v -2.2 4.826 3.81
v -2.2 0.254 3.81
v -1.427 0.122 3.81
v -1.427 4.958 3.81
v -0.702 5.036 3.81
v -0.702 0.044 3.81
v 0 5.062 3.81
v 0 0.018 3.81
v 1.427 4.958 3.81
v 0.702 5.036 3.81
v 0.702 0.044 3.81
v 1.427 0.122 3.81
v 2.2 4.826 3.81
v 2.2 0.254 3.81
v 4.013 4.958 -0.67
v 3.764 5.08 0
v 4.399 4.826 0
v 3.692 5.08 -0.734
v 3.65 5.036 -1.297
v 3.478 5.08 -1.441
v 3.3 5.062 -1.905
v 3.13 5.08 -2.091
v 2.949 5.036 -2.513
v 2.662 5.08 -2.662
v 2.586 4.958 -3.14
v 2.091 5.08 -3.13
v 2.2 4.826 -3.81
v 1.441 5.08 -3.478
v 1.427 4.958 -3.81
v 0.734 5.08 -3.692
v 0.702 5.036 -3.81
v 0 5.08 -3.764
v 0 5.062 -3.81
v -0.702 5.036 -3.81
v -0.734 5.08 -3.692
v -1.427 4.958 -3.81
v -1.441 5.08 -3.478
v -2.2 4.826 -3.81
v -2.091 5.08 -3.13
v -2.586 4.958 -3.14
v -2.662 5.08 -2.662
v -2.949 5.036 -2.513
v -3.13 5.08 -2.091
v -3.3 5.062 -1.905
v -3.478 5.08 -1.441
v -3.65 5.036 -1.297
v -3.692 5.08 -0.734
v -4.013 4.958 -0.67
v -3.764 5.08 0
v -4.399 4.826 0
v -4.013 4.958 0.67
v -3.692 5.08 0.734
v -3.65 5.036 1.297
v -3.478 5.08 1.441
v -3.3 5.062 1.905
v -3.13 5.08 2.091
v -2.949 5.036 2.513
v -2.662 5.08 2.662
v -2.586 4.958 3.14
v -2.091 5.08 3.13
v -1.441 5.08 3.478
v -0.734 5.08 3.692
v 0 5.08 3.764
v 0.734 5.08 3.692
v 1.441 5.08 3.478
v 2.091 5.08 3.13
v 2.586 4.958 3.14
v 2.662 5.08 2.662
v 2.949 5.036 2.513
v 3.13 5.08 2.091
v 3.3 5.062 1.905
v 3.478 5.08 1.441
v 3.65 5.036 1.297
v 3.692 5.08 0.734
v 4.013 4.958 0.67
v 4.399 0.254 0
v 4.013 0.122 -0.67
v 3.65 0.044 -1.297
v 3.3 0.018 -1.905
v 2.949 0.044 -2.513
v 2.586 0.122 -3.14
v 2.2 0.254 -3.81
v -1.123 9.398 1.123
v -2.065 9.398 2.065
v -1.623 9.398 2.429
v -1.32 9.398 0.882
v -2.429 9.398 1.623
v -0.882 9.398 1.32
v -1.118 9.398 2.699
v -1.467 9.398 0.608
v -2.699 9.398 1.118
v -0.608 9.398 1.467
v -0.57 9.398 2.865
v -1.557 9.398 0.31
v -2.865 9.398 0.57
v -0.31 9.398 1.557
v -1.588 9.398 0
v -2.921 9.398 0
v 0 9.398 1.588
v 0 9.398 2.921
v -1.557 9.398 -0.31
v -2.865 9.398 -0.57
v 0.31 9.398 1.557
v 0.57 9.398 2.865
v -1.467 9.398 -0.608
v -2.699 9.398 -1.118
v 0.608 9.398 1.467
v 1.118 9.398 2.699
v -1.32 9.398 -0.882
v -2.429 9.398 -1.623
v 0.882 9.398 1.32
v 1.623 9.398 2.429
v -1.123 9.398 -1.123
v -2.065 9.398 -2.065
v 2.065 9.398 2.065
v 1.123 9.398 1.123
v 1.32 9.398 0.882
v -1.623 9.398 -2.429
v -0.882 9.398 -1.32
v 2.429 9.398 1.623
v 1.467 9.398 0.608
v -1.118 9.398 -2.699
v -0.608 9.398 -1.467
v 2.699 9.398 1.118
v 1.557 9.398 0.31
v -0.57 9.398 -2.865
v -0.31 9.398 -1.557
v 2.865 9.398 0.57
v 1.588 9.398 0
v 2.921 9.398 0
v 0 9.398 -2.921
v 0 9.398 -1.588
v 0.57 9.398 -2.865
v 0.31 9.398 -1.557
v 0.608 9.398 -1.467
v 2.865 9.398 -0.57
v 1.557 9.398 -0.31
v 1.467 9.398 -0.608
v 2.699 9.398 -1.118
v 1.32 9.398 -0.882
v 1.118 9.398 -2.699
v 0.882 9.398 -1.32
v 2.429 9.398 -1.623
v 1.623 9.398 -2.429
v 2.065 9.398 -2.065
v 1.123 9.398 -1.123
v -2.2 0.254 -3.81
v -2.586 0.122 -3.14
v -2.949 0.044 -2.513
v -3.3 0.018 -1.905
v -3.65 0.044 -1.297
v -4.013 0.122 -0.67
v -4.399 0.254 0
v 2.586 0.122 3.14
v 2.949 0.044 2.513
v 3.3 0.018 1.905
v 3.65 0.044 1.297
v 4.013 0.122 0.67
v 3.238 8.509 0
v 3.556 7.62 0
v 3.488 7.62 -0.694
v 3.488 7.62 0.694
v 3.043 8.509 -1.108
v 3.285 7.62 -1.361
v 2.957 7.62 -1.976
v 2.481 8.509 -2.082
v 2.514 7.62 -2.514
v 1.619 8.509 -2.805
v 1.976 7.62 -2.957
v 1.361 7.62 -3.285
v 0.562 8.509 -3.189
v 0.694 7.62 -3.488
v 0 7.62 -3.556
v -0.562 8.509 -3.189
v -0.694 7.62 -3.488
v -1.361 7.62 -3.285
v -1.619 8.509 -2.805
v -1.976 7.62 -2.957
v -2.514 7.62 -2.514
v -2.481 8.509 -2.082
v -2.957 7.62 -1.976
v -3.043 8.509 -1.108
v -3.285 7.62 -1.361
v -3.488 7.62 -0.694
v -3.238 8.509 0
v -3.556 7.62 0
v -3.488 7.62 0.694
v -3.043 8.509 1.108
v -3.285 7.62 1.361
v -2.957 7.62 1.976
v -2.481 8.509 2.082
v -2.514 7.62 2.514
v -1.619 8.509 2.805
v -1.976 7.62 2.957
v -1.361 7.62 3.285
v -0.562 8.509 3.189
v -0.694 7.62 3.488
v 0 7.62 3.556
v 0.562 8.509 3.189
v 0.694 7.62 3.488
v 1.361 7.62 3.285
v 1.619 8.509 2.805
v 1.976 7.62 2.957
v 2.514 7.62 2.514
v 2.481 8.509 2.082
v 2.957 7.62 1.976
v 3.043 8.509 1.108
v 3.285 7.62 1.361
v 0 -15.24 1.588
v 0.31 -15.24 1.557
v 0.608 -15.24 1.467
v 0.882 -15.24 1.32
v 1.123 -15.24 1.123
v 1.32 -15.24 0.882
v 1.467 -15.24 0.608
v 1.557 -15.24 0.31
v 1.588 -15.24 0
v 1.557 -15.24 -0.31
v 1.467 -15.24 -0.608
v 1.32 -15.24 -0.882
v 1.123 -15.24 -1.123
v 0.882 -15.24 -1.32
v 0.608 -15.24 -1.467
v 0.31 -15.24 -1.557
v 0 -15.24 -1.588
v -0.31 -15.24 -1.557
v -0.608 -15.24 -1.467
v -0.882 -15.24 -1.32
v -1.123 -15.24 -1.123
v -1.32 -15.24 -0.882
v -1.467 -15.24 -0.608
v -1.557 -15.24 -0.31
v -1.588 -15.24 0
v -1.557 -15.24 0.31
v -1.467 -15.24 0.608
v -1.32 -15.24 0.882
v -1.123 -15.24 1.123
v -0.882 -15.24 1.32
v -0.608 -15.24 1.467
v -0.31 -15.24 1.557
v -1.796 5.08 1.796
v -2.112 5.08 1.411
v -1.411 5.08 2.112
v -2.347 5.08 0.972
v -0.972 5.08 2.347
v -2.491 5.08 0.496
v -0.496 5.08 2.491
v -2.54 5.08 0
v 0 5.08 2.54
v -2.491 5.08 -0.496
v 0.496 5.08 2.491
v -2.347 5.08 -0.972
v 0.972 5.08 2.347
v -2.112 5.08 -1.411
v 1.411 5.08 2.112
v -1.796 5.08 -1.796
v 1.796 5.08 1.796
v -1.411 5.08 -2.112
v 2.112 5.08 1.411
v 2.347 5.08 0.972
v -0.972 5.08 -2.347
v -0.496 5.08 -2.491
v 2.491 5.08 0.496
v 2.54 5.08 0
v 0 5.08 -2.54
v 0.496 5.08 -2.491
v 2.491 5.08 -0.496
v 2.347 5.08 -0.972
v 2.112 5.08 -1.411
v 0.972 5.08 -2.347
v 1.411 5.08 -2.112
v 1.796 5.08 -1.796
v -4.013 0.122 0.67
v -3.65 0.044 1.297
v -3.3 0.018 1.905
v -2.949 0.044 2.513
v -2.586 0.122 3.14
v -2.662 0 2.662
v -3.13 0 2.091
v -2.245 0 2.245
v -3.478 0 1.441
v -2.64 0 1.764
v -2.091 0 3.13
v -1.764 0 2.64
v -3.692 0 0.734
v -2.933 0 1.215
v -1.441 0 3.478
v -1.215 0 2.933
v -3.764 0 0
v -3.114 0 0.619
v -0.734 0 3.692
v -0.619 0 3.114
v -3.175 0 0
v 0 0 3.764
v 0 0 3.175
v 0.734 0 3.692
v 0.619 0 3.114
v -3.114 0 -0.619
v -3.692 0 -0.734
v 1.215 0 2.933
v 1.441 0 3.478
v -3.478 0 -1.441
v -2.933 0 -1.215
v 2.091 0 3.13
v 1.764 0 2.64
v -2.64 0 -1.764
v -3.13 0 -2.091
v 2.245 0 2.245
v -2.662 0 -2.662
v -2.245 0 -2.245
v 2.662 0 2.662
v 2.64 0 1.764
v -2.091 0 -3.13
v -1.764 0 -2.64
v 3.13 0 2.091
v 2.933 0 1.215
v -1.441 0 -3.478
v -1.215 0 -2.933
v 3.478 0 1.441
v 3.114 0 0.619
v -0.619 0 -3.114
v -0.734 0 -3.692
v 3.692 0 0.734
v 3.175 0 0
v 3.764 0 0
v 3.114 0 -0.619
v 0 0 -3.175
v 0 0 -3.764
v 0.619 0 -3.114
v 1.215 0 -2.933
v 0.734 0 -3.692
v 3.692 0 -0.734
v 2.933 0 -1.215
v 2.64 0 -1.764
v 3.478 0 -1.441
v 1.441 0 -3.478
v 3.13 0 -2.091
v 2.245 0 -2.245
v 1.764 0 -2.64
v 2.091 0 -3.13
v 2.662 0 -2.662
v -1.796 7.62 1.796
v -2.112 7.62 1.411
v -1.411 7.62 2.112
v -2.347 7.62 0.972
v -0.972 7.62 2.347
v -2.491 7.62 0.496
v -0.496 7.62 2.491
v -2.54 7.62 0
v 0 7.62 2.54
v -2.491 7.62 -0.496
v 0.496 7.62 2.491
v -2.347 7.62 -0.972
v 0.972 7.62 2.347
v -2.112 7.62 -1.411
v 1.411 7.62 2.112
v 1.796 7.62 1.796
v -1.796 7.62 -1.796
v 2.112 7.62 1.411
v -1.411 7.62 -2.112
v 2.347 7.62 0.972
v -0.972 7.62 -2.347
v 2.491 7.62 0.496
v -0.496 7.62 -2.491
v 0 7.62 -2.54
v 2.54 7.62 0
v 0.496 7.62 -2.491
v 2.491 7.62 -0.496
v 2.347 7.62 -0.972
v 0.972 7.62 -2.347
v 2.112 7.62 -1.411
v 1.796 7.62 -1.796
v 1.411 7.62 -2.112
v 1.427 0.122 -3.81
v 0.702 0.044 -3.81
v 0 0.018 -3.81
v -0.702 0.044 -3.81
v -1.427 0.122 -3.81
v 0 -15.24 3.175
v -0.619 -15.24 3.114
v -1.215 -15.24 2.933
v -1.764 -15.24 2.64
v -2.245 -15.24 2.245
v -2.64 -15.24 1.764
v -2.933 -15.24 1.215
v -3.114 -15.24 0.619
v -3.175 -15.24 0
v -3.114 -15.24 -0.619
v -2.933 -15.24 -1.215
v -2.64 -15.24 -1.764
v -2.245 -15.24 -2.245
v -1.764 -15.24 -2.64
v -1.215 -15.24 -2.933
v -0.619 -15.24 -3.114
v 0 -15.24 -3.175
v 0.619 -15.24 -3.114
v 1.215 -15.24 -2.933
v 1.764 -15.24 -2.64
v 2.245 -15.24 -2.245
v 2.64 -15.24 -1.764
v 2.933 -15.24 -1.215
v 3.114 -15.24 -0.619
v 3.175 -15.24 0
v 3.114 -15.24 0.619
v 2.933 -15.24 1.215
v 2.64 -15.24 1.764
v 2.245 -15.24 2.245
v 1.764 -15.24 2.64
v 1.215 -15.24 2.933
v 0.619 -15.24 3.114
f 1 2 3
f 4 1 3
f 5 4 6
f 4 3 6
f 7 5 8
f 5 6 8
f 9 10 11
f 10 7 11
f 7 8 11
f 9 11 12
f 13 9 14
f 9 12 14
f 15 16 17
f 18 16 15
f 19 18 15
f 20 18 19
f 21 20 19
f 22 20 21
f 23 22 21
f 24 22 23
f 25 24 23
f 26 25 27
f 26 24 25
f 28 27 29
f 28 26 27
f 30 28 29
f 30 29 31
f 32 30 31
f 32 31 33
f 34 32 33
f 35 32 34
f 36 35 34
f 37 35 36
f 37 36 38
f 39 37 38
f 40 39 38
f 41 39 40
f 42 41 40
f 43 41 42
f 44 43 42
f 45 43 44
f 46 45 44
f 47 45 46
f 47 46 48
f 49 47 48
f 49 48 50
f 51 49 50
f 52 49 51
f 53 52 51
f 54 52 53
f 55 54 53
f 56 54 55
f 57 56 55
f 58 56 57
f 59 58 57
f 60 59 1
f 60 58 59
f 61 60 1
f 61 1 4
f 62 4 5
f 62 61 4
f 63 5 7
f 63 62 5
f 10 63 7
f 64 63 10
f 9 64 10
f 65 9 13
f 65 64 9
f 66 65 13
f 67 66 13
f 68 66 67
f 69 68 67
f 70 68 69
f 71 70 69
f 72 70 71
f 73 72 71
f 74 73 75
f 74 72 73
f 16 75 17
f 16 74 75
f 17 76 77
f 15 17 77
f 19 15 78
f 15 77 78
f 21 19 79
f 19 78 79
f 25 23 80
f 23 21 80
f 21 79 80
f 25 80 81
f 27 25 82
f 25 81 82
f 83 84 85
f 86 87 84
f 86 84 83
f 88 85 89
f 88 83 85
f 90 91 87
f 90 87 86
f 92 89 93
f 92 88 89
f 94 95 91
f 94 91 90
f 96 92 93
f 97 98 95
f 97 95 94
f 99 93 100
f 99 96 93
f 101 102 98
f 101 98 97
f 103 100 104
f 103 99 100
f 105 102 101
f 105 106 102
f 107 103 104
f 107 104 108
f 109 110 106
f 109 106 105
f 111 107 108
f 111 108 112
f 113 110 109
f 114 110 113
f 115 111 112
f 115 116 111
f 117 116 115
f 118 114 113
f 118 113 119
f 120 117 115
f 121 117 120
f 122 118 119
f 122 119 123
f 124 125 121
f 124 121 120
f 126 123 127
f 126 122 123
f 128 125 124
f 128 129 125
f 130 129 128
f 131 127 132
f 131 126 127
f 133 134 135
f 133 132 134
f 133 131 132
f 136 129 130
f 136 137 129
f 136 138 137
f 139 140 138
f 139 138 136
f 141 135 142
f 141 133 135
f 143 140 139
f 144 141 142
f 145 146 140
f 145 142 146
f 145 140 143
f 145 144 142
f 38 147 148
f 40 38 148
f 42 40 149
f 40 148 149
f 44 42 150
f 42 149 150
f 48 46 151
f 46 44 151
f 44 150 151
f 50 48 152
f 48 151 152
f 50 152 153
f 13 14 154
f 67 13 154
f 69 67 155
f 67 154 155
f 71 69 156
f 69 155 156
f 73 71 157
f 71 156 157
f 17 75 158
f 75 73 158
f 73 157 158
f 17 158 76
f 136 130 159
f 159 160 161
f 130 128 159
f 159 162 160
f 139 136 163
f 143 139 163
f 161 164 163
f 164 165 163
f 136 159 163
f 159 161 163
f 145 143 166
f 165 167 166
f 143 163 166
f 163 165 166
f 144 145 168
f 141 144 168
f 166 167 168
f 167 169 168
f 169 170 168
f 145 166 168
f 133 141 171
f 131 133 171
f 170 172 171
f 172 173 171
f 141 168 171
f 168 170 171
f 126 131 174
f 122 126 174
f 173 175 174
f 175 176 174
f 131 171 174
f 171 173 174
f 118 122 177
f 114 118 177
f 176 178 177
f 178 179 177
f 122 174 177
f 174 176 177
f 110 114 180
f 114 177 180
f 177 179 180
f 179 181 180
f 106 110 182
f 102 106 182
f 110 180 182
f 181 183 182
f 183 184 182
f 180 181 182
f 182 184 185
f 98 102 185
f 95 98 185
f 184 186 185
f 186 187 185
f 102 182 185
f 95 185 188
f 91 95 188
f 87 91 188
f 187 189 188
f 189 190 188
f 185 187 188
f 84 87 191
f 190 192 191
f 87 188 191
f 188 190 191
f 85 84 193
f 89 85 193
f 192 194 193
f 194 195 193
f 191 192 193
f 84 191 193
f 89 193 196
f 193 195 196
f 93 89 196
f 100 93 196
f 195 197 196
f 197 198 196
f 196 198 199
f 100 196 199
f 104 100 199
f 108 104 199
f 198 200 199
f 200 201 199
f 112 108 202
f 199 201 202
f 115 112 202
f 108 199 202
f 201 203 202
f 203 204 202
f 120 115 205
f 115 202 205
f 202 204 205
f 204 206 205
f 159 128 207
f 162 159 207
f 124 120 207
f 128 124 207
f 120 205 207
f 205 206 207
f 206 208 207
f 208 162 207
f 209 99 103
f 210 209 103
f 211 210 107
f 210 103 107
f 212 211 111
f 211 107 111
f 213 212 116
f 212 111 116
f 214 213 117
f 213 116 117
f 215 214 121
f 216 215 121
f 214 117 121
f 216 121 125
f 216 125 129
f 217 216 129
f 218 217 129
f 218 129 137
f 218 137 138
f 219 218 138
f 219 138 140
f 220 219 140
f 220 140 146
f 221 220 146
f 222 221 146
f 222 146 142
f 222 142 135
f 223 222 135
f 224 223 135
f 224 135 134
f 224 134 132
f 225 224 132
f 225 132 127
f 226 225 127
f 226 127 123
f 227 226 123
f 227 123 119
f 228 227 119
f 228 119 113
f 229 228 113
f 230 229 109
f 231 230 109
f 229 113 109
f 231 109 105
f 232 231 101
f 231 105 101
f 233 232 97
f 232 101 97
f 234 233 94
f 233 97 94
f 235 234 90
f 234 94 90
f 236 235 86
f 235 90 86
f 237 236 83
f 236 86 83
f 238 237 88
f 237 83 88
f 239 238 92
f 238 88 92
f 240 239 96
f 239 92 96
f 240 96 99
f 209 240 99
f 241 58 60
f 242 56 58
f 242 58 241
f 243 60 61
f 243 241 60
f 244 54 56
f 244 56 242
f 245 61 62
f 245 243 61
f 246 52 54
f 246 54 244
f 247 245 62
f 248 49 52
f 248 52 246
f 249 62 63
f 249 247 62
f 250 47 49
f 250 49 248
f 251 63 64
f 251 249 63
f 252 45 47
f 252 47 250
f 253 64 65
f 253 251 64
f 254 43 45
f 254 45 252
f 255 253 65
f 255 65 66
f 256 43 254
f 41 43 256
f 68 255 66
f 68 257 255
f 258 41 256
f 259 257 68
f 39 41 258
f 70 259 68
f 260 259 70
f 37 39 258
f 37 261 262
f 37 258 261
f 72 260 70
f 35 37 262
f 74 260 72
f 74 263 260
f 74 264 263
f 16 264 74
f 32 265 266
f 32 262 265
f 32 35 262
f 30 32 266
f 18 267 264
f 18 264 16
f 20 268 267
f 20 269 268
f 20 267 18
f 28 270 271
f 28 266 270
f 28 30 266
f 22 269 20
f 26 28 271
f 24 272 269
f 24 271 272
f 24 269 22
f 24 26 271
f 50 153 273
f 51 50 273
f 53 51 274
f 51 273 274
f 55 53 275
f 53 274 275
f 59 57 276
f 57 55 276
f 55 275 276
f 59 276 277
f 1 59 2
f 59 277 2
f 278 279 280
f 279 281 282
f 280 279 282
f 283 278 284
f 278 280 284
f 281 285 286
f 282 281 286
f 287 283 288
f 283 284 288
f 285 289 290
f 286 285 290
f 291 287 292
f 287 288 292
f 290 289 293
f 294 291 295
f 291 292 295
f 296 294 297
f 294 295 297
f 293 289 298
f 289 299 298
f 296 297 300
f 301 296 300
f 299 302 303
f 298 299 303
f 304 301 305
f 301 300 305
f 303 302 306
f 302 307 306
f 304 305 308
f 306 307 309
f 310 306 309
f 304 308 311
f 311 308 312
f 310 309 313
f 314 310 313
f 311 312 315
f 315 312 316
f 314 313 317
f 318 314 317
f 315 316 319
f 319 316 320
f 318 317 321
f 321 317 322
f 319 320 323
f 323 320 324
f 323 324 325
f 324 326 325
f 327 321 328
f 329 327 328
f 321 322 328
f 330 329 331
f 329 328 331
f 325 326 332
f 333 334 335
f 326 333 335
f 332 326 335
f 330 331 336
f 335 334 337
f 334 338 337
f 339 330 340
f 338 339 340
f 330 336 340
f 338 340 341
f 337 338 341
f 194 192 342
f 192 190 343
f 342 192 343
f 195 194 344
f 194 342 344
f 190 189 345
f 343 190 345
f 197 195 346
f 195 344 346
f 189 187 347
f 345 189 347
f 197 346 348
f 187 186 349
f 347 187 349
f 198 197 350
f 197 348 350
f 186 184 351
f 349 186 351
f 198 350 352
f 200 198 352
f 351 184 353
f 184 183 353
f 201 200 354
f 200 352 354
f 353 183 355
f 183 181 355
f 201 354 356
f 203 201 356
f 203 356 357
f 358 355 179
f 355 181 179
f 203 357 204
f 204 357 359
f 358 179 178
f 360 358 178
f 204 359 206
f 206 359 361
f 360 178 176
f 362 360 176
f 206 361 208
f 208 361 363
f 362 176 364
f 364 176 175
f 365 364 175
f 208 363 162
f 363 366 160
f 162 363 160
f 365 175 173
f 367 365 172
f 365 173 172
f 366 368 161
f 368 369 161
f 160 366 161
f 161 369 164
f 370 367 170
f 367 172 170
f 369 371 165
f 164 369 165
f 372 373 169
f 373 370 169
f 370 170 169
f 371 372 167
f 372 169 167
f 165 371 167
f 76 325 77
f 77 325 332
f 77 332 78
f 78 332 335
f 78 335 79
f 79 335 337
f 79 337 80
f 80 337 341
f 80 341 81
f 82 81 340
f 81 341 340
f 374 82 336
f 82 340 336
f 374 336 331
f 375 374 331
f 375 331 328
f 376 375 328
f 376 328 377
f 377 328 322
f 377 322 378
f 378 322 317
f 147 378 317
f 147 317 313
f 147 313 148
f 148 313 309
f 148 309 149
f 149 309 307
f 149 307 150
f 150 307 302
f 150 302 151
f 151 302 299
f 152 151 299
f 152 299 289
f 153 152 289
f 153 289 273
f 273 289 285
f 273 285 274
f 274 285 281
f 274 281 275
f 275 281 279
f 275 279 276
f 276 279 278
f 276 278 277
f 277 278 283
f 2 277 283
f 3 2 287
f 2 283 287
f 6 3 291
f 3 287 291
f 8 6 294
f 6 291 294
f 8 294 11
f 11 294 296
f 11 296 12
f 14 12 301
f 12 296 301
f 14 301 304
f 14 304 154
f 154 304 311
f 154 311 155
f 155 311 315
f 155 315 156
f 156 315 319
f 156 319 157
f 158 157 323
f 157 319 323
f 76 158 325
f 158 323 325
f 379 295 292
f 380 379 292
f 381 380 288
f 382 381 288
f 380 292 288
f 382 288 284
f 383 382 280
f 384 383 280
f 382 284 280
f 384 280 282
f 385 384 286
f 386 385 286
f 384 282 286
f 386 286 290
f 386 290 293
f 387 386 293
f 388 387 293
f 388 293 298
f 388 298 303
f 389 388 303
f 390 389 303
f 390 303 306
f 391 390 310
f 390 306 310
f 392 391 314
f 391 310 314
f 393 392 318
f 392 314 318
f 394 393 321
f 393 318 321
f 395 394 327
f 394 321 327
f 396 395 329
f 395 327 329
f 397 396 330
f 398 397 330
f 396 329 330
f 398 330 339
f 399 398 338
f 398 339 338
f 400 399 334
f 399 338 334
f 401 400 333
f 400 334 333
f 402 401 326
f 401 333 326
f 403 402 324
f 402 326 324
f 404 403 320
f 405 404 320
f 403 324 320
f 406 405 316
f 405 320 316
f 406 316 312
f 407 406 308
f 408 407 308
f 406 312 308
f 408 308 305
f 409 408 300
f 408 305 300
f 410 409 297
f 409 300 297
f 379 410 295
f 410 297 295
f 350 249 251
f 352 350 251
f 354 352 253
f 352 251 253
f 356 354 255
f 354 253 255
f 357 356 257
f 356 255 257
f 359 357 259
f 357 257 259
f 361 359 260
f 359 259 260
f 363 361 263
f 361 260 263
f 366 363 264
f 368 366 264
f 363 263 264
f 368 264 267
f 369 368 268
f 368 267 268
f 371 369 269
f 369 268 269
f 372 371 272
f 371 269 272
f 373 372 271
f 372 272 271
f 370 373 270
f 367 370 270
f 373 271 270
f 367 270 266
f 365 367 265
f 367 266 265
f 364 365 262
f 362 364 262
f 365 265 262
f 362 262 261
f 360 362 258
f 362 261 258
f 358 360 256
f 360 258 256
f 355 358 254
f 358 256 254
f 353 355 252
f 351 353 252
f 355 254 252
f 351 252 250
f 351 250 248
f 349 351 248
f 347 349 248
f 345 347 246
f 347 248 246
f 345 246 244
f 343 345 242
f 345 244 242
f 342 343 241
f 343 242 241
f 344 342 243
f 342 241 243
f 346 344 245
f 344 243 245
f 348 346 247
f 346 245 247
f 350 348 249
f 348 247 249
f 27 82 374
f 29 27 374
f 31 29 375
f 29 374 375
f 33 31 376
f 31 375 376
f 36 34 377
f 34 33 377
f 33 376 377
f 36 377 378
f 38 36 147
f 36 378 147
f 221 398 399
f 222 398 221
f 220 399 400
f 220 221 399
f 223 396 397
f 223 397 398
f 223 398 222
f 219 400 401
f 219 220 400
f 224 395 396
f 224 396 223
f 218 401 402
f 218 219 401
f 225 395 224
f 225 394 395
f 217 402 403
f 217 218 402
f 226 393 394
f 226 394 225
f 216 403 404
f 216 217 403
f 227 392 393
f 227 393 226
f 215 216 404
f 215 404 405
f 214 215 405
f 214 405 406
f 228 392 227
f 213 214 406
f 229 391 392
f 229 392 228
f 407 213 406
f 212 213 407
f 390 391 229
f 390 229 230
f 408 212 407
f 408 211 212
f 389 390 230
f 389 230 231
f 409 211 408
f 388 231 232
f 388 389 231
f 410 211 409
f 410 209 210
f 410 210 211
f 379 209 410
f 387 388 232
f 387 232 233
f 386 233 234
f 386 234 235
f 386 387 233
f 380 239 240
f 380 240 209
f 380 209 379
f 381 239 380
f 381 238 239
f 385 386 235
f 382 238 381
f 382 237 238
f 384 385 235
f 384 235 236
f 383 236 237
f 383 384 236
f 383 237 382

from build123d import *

# Parameters (mm, degrees)
BOSS_EXTRUDE1_DEPTH = 5.08
SKETCH2_R           = 2.54
BOSS_EXTRUDE2_DEPTH = 2.54
SKETCH4_R           = 2.921
SKETCH3_R           = 3.556
SKETCH7_R           = 3.175
BOSS_EXTRUDE3_DEPTH = 15.24
SKETCH8_R           = 1.5875
CUT_EXTRUDE1_DEPTH  = 26.316041239


with BuildPart() as part:
    # Sketch1 → Boss-Extrude1 (new body)
    with BuildSketch(Plane(origin=(0, 0, 0), x_dir=(1, 0, 0), z_dir=(0, 1, 0))):
        Polygon((2.199704526, 3.81), (-2.199704526, 3.81), (-4.399409051, 0), (-2.199704526, -3.81), (2.199704526, -3.81), (4.399409051, 0), align=None)
    extrude(amount=BOSS_EXTRUDE1_DEPTH)

    # Sketch2 → Boss-Extrude2 (add)
    with BuildSketch(Plane(origin=(0, 5.08, 0), x_dir=(1, 0, 0), z_dir=(0, 1, 0))):
        with Locations(Location((0, 0, 0), (0, 0, 270))):
            Circle(SKETCH2_R)
    extrude(amount=BOSS_EXTRUDE2_DEPTH)

    # Sketch4 → Loft1 section 0
    with BuildSketch(Plane(origin=(0, 9.398, 0), x_dir=(1, 0, 0), z_dir=(0, 1, 0))):
        Circle(SKETCH4_R)
    # Sketch3 → Loft1 section 1
    with BuildSketch(Plane(origin=(0, 7.62, 0), x_dir=(1, 0, 0), z_dir=(0, 1, 0))):
        Circle(SKETCH3_R)
    loft()

    # Sketch6 → Cut-Revolve1 (revolve, cut)
    with BuildSketch(Plane.XY):
        Polygon((4.399409051, 4.826), (3.764409051, 5.08), (4.399409051, 5.08), align=None)
        Polygon((4.399409051, 0), (4.399409051, 0.254), (3.764409051, 0), align=None)
    revolve(axis=Axis((0, 0, 0), (0, 1, 0)), mode=Mode.SUBTRACT)

    # Sketch7 → Boss-Extrude3 (add)
    with BuildSketch(Plane.XZ):
        with Locations(Location((0, 0, 0), (0, 0, 90))):
            Circle(SKETCH7_R)
    extrude(amount=BOSS_EXTRUDE3_DEPTH)

    # Sketch8 → Cut-Extrude1 (cut, through all)
    with BuildSketch(Plane(origin=(0, 9.398, 0), x_dir=(1, 0, 0), z_dir=(0, 1, 0))):
        with Locations(Location((0, 0, 0), (0, 0, 270))):
            Circle(SKETCH8_R)
    extrude(amount=-CUT_EXTRUDE1_DEPTH, mode=Mode.SUBTRACT)


solid = part.part
